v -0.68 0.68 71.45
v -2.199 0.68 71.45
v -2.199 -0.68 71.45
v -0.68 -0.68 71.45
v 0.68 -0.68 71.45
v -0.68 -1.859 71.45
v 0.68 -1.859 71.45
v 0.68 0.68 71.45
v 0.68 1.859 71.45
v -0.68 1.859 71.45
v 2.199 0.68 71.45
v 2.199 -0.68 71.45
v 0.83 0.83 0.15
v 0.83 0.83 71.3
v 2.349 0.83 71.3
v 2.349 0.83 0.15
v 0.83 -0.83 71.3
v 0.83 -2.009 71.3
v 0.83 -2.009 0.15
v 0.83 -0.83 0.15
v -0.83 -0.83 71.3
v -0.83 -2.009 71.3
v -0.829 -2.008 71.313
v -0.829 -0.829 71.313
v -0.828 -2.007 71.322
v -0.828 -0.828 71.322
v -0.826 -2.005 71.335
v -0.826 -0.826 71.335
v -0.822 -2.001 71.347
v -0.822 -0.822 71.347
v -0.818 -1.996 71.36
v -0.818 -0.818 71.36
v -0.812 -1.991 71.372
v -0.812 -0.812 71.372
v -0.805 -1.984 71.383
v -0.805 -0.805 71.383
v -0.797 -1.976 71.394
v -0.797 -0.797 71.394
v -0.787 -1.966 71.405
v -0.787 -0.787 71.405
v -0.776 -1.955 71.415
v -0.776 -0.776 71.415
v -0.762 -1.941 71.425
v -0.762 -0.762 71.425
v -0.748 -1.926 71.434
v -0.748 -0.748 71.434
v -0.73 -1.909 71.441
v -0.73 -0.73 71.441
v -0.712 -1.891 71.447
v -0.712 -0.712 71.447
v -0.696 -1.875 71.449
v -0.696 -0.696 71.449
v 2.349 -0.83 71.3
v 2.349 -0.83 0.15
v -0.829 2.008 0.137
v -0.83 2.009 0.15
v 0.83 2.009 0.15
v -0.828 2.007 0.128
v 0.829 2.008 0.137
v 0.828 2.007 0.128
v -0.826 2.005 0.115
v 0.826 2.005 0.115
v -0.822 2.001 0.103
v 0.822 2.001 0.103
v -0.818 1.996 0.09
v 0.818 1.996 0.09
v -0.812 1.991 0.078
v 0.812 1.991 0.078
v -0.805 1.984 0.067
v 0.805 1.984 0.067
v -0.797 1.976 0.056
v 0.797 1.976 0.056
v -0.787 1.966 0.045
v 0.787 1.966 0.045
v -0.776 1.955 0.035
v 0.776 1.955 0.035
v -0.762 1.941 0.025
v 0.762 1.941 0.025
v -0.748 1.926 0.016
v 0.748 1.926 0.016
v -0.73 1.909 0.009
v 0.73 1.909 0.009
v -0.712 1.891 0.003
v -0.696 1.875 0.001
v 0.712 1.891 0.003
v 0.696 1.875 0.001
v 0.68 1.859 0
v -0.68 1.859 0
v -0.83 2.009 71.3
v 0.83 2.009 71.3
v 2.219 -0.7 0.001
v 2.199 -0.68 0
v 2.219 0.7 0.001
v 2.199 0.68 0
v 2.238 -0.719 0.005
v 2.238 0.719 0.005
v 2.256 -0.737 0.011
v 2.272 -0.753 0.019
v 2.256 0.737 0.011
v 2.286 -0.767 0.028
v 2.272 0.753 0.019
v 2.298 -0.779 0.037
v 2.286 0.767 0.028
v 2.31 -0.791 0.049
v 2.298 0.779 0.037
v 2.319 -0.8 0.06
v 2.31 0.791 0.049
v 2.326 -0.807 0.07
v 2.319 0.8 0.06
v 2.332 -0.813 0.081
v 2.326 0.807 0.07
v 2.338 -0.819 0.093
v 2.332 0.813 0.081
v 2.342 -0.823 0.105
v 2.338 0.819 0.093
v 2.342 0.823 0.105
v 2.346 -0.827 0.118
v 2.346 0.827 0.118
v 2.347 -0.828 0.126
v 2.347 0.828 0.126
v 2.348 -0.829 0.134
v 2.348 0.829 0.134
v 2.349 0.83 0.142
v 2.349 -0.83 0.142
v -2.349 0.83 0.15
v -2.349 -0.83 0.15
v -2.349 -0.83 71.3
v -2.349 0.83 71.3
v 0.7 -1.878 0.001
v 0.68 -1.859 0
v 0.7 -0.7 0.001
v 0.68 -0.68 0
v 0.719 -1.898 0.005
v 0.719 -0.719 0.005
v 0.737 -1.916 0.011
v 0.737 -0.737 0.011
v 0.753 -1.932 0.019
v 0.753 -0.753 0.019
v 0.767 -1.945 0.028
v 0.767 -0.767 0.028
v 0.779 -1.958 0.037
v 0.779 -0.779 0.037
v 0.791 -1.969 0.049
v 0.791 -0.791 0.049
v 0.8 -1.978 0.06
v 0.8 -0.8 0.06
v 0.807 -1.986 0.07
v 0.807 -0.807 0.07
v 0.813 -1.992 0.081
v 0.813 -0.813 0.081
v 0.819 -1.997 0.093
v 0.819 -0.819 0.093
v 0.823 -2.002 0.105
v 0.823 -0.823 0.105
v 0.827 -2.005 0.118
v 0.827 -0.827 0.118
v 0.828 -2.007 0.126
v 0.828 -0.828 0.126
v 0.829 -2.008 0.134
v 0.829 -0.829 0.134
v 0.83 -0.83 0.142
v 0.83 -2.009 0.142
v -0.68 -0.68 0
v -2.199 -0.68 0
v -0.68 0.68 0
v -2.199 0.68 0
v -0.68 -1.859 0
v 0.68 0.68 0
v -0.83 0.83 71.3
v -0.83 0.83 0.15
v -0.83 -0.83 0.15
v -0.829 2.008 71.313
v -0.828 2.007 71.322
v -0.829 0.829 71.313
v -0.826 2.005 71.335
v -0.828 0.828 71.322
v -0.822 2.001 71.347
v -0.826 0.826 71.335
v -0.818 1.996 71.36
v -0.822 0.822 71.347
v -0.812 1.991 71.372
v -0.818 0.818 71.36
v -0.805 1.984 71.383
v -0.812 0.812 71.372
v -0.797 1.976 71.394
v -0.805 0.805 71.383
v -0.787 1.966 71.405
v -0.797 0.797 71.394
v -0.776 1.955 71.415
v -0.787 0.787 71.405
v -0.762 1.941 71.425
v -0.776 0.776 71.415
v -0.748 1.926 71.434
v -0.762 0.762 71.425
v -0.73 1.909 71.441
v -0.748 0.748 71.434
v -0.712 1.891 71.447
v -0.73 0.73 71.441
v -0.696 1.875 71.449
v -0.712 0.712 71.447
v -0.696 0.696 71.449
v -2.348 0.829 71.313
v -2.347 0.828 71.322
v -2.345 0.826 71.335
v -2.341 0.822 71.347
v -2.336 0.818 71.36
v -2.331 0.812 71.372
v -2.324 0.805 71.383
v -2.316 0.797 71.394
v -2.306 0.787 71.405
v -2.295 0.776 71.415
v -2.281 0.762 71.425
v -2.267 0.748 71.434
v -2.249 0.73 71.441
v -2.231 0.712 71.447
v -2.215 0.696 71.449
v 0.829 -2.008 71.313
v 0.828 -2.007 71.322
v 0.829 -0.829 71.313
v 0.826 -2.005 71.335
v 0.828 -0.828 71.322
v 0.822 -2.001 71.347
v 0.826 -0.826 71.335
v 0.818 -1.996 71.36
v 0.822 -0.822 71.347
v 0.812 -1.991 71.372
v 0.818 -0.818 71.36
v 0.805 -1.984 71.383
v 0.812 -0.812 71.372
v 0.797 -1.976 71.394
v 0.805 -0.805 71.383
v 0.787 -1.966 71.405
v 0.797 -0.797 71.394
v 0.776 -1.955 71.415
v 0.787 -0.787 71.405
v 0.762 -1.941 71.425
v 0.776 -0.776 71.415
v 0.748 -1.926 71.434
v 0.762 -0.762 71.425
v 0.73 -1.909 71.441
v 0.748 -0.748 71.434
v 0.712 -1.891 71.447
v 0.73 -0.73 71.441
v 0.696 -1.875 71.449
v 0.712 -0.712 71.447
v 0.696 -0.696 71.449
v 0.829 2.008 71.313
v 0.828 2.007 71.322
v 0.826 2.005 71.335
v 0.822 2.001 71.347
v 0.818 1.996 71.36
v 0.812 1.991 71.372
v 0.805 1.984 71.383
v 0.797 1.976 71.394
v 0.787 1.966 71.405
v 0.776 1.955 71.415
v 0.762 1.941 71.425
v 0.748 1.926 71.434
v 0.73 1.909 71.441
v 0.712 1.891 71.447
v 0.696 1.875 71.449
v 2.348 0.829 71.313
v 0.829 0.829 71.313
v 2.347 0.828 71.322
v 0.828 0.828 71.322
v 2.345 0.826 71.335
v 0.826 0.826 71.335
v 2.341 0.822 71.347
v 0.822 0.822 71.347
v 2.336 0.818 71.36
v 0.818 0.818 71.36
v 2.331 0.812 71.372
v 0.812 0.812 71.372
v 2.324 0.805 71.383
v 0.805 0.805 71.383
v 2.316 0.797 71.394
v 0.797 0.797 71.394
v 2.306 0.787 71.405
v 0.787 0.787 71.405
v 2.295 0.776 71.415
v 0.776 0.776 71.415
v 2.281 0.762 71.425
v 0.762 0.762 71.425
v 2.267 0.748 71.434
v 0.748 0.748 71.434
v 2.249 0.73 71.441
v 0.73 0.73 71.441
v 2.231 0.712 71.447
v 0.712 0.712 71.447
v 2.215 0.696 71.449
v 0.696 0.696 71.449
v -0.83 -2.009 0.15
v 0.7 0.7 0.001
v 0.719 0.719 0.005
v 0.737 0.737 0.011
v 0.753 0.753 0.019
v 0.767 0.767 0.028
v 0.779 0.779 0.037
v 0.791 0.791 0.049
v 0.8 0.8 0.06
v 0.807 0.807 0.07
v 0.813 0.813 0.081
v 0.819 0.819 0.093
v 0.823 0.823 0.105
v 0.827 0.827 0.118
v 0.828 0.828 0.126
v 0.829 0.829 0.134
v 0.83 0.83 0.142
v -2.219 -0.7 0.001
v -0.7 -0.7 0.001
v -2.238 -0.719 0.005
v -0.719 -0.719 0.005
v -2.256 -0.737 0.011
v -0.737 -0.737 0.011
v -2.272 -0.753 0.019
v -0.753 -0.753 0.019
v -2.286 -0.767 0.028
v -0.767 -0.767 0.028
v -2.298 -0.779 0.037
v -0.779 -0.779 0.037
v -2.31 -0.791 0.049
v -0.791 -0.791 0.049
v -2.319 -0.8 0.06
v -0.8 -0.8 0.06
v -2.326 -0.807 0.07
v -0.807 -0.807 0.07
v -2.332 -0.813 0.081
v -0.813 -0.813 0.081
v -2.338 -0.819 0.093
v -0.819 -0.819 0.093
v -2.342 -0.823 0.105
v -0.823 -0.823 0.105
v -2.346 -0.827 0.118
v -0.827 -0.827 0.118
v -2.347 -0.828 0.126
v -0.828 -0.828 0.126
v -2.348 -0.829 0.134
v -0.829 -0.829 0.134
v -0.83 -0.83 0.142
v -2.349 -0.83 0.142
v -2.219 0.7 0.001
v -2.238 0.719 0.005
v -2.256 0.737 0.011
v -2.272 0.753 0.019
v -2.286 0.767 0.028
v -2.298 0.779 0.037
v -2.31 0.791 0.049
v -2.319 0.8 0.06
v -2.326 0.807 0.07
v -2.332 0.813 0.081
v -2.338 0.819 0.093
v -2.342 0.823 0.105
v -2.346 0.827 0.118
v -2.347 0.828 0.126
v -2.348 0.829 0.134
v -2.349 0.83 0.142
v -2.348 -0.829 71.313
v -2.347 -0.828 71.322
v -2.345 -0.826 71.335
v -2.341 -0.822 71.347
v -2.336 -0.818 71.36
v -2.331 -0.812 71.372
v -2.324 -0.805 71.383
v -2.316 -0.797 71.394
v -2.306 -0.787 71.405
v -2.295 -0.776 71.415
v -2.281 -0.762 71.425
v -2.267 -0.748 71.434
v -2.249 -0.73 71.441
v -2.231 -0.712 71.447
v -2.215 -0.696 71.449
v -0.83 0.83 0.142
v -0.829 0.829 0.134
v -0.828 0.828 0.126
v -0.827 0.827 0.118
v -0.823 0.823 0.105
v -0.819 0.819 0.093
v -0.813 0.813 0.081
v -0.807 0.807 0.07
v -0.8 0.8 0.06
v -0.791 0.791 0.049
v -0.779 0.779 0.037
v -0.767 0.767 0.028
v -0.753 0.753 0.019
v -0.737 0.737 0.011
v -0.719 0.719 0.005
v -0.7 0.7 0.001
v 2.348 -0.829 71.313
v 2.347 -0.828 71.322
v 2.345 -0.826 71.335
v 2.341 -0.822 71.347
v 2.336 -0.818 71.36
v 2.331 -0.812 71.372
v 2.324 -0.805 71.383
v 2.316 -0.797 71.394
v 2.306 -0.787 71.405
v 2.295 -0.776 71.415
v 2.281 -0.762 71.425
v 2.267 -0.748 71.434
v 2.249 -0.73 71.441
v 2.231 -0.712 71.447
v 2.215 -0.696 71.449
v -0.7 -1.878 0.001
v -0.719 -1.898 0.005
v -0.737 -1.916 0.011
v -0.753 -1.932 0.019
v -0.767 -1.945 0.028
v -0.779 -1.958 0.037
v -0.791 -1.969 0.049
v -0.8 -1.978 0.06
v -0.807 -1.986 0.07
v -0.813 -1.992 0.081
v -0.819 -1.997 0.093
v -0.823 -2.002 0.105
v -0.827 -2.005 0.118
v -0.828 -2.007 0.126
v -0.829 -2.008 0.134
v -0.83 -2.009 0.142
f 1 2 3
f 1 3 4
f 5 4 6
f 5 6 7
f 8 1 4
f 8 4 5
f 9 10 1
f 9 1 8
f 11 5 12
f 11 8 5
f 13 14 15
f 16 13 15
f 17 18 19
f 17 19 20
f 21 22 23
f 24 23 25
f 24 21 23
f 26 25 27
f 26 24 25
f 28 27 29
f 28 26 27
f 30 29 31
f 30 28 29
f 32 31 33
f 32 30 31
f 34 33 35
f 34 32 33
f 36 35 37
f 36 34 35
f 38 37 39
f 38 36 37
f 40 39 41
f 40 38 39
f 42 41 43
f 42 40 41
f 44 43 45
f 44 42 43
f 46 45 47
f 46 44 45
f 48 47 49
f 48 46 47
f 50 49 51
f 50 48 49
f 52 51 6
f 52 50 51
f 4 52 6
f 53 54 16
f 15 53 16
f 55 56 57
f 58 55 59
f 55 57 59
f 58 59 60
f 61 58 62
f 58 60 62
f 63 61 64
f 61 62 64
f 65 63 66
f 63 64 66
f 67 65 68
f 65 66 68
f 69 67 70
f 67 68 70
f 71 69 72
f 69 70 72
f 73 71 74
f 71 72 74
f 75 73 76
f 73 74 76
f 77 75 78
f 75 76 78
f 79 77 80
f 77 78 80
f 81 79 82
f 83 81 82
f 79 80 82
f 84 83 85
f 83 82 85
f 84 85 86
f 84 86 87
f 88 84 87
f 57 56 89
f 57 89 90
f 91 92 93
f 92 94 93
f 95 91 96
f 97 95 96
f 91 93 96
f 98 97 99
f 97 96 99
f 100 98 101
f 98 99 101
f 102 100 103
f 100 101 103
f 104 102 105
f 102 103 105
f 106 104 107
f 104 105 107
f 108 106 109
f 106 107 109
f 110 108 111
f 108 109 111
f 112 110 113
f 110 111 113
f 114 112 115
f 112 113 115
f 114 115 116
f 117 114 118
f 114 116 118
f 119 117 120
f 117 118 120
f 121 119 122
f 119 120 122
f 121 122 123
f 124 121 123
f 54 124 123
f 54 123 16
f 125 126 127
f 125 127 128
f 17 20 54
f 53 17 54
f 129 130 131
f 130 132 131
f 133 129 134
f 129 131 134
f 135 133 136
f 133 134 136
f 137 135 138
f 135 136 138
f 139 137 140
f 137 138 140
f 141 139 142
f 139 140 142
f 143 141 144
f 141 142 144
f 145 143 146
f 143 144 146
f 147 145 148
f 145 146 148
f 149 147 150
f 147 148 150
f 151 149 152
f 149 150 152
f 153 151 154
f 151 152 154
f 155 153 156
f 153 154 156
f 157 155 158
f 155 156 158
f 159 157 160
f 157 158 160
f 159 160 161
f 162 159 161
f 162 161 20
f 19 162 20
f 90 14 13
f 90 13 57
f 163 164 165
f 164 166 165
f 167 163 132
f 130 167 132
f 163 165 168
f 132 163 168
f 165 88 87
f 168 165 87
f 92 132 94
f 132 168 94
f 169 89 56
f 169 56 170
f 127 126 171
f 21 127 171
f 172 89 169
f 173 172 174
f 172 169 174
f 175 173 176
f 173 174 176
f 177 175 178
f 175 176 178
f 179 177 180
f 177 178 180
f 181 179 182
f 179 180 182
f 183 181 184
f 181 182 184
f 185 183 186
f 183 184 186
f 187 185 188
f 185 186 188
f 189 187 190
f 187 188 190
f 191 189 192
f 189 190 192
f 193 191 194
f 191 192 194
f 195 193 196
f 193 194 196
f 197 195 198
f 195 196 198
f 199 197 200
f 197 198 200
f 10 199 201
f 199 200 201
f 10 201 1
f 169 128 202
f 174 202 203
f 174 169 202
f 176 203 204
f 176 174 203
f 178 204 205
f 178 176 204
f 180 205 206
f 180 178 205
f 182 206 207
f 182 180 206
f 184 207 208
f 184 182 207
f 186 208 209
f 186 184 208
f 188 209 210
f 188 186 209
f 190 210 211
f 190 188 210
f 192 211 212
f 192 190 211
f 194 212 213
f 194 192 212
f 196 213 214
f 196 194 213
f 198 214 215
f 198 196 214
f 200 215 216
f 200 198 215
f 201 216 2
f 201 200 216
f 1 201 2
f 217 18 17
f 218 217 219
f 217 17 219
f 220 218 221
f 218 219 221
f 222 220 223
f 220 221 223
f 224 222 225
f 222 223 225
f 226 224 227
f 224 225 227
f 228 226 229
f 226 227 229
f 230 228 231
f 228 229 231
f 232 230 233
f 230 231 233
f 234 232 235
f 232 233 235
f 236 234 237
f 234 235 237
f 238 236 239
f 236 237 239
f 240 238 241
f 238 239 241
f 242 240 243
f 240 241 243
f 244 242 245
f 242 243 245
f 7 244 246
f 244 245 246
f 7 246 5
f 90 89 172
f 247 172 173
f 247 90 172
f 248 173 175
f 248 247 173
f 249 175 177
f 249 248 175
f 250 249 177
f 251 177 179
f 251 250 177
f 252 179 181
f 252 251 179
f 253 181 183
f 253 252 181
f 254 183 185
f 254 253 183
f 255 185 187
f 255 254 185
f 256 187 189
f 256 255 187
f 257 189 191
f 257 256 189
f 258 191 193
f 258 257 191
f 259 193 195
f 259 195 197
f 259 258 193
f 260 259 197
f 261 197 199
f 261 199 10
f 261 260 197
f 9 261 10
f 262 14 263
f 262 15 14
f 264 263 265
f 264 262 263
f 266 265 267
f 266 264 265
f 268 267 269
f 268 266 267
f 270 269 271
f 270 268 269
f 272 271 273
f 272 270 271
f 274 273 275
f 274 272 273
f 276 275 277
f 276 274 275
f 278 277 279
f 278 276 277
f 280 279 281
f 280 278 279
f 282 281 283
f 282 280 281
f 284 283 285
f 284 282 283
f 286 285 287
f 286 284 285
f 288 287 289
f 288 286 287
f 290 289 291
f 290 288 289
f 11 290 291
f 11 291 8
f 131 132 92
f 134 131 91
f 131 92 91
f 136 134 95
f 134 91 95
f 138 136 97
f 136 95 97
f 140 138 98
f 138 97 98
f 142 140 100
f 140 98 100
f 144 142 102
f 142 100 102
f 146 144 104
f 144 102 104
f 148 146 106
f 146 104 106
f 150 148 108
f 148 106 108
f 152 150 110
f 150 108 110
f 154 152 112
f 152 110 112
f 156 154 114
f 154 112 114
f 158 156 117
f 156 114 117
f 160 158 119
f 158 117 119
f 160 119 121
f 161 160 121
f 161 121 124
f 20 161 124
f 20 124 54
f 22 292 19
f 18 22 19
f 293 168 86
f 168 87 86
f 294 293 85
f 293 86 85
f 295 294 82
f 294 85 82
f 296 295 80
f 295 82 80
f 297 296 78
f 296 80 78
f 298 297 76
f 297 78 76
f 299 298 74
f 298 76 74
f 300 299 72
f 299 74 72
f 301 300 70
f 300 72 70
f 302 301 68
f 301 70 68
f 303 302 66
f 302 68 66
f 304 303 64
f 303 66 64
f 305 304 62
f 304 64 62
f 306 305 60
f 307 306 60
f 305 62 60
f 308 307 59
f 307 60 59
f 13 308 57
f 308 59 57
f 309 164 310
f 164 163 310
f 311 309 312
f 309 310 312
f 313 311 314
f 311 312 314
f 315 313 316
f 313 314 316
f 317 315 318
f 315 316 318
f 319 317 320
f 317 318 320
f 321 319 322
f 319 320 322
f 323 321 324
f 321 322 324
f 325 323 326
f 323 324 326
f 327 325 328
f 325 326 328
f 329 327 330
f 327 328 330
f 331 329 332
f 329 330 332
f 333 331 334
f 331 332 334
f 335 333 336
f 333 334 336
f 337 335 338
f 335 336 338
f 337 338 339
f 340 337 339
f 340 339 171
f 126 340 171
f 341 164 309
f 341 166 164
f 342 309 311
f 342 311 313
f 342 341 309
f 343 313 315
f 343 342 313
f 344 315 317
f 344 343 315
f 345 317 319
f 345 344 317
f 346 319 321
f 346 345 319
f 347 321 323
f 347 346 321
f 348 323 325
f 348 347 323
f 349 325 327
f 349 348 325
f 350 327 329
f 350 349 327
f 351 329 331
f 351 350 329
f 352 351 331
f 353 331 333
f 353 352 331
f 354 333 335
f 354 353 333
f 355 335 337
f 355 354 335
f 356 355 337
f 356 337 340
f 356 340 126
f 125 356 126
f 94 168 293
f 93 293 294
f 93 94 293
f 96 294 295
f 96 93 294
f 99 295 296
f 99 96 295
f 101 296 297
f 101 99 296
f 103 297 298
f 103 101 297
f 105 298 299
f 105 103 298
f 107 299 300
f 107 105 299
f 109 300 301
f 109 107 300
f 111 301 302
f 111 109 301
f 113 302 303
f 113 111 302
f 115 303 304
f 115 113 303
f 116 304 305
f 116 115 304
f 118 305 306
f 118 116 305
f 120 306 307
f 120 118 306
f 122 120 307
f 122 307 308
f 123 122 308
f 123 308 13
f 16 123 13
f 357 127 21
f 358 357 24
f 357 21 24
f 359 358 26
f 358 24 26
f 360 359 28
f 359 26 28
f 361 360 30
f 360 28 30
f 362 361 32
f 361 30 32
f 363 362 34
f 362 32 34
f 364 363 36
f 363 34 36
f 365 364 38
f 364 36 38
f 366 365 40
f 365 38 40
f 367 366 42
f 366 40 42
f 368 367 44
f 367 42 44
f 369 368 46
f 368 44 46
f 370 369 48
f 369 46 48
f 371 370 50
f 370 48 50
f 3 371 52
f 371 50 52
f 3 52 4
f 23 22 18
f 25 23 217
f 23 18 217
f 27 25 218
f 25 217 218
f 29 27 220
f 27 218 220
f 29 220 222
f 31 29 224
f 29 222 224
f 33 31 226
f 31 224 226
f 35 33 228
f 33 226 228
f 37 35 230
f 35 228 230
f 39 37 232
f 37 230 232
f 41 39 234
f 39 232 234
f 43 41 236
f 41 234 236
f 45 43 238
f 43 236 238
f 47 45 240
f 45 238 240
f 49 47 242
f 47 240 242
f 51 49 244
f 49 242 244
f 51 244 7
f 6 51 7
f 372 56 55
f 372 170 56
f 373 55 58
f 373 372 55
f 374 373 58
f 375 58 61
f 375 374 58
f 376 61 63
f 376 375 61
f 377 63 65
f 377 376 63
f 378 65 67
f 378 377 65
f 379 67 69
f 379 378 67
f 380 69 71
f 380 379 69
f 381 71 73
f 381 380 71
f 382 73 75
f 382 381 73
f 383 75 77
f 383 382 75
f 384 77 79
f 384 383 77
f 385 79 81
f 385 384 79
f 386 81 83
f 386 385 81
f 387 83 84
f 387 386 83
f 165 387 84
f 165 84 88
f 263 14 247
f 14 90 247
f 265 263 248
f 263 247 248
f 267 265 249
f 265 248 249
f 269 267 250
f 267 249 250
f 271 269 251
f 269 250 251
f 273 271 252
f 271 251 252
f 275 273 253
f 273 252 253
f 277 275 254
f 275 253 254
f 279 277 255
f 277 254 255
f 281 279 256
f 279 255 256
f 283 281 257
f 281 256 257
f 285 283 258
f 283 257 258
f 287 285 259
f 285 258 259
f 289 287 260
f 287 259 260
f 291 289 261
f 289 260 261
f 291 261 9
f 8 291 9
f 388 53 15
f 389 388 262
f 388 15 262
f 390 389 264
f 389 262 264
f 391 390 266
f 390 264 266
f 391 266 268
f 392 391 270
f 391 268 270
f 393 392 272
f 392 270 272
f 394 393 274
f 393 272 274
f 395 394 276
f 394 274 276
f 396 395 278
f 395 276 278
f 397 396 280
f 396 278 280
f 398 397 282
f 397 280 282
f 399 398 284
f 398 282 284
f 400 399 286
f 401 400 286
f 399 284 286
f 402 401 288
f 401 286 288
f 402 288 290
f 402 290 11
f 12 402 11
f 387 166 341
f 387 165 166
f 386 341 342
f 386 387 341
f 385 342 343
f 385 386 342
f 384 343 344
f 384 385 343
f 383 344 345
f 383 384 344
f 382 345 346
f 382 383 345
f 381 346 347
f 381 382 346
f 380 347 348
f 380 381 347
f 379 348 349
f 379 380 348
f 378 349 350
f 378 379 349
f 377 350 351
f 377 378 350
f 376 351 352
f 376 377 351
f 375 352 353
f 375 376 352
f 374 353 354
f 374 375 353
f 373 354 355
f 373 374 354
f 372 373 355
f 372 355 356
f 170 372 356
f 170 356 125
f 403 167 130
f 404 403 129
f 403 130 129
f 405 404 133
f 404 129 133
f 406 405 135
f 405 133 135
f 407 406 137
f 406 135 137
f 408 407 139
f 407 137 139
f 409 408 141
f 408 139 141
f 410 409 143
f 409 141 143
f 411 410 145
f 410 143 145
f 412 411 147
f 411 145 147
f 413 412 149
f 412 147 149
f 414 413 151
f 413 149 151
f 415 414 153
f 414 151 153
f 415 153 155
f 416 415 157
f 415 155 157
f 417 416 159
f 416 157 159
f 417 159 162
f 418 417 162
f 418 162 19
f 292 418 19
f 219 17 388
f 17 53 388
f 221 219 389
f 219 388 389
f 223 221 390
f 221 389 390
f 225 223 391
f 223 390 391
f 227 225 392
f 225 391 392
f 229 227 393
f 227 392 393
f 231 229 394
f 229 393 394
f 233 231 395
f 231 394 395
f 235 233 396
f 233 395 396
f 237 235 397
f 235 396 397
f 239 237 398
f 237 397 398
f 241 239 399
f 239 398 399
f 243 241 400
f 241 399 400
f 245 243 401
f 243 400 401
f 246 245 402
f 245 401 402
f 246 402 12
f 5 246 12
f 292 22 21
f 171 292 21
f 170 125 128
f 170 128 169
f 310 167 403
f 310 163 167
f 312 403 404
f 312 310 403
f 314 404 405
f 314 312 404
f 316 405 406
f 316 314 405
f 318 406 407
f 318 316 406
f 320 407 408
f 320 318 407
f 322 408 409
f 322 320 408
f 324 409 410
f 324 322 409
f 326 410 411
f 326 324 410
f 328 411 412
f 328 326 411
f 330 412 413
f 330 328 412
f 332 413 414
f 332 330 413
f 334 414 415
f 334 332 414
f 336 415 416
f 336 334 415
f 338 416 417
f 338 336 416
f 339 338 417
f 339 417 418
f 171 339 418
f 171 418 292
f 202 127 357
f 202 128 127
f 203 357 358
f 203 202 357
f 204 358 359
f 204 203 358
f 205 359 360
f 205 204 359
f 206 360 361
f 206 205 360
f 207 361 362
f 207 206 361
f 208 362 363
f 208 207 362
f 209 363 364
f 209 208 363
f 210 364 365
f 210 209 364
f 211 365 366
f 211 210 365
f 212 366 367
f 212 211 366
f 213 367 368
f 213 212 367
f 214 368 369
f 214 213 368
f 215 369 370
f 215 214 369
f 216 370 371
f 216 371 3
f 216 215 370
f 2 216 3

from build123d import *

# Parameters (mm, degrees)
F0_W     = 1.66
F0_H     = 1.1787281516
F0_W_2   = 1.5189777559
F0_H_2   = 1.66
F1_DEPTH = 71.45
F2_R     = 0.15
F3_R     = 0.15


with BuildPart() as f1:
    # F0 (on Top) → F1 (new body)
    with BuildSketch(Plane.XY):
        with Locations((0, 1.4193640758)):
            Rectangle(F0_W, F0_H)
        with Locations((1.5894888779, 0)):
            Rectangle(F0_W_2, F0_H_2)
        Rectangle(F0_W, F0_H_2)
        with Locations((-1.5894888779, 0)):
            Rectangle(F0_W_2, F0_H_2)
        with Locations((0, -1.4193640758)):
            Rectangle(F0_W, F0_H)
    extrude(amount=F1_DEPTH)

    # F2
    f2_edges = [f1.edges().sort_by_distance(p)[0] for p in [
        (-2.348978, 0, 71.45),
        (-1.589489, 0.83, 71.45),
        (-0.83, 1.419364, 71.45),
        (0, 2.008728, 71.45),
        (0.83, 1.419364, 71.45),
        (2.348978, 0, 71.45),
        (1.589489, 0.83, 71.45),
        (1.589489, -0.83, 71.45),
        (0.83, -1.419364, 71.45),
        (0, -2.008728, 71.45),
        (-0.83, -1.419364, 71.45),
        (-1.589489, -0.83, 71.45),
    ]]
    fillet(f2_edges, radius=F2_R)

    # F3
    f3_edges = [f1.edges().sort_by_distance(p)[0] for p in [
        (-1.589489, -0.83, 0),
        (-2.348978, 0, 0),
        (-1.589489, 0.83, 0),
        (-0.83, 1.419364, 0),
        (0, 2.008728, 0),
        (0.83, 1.419364, 0),
        (1.589489, 0.83, 0),
        (2.348978, 0, 0),
        (1.589489, -0.83, 0),
        (0.83, -1.419364, 0),
        (0, -2.008728, 0),
        (-0.83, -1.419364, 0),
    ]]
    fillet(f3_edges, radius=F3_R)


solid = f1.part
